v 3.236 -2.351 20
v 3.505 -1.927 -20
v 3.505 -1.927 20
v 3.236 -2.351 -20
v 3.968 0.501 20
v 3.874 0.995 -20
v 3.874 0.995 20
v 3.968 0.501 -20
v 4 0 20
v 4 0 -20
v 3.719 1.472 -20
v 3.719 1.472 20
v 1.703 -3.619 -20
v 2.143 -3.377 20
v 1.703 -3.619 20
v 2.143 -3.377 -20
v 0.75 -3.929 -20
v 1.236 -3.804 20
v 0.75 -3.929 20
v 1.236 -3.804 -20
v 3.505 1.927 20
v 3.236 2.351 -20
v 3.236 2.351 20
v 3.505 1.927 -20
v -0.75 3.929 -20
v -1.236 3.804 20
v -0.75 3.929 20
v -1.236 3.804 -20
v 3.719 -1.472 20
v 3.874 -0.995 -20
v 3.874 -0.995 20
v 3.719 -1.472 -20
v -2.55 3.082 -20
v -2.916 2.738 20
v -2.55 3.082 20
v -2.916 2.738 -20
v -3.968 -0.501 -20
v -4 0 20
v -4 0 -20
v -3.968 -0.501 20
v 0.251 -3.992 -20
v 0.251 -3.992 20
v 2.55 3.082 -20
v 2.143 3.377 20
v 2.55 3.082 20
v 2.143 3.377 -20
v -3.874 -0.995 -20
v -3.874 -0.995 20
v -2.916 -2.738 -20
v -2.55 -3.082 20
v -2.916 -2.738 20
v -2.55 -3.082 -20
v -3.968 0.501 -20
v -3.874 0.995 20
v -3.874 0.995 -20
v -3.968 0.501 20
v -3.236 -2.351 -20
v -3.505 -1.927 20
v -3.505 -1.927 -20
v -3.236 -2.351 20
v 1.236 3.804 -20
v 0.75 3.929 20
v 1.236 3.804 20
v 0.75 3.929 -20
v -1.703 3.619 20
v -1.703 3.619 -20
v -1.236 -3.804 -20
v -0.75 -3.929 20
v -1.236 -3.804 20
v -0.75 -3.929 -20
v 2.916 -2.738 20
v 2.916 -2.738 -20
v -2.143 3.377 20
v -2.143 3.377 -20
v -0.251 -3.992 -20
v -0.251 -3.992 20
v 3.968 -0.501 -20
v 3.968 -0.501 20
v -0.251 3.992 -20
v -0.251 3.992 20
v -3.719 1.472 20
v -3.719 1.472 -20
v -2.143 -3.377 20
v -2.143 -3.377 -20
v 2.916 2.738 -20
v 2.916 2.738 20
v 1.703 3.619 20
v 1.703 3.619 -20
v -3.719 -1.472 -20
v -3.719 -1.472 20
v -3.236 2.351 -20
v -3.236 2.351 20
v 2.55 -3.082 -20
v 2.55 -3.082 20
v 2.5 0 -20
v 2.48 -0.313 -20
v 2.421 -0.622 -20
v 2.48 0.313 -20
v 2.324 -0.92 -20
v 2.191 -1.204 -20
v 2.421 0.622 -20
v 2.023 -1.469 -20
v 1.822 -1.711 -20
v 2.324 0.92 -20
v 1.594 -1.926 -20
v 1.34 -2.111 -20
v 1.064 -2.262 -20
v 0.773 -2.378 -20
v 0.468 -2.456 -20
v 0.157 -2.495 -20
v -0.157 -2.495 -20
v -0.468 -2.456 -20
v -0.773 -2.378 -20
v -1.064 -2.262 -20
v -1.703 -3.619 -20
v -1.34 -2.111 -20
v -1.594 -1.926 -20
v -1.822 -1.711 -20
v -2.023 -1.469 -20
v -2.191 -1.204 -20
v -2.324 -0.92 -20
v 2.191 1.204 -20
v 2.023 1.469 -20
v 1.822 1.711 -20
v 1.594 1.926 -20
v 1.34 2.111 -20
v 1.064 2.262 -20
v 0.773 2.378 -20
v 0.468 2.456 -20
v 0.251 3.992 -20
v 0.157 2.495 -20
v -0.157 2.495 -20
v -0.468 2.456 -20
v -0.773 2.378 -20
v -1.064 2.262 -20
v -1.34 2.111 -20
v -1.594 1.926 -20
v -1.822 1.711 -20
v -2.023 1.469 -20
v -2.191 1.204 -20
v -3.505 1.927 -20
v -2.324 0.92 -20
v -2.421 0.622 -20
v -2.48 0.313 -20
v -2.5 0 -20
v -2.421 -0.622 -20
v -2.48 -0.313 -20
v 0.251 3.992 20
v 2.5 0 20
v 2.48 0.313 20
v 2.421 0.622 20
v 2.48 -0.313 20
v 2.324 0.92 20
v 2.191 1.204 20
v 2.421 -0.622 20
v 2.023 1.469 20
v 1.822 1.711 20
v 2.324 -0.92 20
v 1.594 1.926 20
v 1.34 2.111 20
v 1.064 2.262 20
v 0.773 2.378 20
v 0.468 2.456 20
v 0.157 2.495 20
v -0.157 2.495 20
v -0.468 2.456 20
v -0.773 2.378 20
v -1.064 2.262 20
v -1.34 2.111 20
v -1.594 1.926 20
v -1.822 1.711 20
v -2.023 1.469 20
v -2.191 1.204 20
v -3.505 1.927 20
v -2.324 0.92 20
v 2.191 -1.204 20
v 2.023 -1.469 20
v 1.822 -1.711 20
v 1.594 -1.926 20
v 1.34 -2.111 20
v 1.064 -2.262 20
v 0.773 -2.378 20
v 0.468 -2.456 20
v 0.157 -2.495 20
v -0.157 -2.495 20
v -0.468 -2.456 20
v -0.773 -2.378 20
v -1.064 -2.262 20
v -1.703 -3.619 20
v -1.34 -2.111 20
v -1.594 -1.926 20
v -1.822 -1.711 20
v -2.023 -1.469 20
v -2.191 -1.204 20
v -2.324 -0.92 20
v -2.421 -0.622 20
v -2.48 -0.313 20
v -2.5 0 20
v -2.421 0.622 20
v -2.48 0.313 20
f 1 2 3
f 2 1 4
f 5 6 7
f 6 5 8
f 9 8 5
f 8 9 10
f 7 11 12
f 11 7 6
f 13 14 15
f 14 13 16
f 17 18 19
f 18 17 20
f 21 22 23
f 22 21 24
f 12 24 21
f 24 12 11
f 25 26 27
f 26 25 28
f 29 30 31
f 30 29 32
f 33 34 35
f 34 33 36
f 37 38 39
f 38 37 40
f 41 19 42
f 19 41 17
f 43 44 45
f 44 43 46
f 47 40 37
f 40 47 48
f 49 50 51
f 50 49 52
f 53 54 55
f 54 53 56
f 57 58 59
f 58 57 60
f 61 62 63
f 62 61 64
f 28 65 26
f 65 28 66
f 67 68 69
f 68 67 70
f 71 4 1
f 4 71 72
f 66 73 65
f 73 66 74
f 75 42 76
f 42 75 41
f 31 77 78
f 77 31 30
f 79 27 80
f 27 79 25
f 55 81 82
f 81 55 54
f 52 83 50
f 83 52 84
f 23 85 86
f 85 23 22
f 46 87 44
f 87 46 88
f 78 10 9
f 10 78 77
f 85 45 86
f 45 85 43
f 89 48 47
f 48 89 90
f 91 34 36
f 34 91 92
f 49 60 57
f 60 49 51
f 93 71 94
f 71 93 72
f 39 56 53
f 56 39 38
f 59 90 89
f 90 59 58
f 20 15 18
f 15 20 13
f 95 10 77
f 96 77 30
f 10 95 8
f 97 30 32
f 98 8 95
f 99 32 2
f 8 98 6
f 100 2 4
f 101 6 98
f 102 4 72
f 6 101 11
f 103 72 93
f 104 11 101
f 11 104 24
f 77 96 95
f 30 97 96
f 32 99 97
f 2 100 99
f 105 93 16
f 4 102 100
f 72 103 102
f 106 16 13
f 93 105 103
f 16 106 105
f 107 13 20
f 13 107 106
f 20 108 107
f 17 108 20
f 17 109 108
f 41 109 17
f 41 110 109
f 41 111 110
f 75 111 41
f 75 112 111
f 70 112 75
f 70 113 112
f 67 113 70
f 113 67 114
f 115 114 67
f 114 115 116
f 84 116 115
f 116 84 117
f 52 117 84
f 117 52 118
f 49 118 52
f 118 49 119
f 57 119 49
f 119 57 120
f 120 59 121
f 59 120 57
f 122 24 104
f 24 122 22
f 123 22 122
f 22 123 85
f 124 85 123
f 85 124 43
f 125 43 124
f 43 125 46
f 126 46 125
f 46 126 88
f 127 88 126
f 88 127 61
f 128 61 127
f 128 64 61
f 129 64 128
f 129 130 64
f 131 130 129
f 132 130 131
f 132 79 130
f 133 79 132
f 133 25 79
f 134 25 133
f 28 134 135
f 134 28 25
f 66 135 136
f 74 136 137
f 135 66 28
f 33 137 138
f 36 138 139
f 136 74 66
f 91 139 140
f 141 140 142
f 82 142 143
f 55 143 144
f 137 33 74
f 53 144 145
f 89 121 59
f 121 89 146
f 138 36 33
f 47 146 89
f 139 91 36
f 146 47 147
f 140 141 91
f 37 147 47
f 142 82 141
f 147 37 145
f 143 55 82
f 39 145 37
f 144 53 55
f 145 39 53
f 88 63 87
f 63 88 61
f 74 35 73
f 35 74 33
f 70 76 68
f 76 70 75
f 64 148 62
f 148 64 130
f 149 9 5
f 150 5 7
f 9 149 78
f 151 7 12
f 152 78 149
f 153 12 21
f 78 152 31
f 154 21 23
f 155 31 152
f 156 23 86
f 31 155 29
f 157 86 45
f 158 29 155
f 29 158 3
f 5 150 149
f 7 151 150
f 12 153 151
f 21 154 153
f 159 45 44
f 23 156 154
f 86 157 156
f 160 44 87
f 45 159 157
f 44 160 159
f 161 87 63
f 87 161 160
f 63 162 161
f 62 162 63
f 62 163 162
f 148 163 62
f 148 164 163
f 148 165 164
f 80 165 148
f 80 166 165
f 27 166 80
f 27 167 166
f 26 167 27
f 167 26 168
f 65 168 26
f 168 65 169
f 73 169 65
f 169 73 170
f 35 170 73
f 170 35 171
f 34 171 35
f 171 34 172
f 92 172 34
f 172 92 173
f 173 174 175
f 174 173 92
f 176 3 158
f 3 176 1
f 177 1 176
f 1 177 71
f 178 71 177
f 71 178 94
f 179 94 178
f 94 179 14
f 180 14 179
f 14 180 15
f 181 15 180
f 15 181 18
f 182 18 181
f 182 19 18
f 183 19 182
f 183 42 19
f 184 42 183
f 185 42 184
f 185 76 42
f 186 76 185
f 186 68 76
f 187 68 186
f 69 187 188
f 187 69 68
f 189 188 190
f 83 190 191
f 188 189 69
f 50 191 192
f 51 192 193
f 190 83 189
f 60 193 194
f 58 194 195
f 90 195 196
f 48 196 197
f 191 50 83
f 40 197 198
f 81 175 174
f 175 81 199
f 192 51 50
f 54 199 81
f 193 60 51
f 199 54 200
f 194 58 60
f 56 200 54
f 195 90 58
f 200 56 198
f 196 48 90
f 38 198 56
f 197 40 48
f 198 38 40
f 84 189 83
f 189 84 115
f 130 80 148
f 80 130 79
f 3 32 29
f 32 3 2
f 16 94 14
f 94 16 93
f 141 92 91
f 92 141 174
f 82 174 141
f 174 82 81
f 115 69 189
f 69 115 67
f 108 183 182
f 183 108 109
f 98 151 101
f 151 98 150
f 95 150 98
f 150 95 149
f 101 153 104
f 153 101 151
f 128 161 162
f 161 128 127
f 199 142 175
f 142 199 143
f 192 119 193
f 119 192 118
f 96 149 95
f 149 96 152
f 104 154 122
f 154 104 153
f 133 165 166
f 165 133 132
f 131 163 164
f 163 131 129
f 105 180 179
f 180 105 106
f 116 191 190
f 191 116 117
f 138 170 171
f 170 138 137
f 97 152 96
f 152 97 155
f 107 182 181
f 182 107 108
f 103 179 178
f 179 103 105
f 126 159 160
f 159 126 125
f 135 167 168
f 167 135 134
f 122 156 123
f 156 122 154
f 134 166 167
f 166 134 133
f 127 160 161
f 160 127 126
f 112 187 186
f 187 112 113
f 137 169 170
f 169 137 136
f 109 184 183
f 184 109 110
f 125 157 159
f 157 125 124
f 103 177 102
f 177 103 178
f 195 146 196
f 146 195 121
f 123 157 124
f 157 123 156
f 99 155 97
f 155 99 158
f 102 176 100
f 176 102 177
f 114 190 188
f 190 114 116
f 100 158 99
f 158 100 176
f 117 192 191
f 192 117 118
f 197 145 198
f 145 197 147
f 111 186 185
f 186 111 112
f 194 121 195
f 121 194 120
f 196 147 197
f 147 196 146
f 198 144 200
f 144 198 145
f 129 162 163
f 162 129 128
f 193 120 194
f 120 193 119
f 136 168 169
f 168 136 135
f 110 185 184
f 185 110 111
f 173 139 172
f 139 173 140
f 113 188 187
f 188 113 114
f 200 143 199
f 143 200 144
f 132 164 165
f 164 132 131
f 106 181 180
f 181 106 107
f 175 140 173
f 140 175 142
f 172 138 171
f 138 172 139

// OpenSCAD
$fn = 50;


difference() {
	union() {
		translate(v = [0, 0, -20.0000000000]) {
			cylinder(h = 40, r = 4.0000000000);
		}
	}
	union() {
		translate(v = [0, 0, -100.0000000000]) {
			cylinder(h = 200, r = 2.5000000000);
		}
	}
}
